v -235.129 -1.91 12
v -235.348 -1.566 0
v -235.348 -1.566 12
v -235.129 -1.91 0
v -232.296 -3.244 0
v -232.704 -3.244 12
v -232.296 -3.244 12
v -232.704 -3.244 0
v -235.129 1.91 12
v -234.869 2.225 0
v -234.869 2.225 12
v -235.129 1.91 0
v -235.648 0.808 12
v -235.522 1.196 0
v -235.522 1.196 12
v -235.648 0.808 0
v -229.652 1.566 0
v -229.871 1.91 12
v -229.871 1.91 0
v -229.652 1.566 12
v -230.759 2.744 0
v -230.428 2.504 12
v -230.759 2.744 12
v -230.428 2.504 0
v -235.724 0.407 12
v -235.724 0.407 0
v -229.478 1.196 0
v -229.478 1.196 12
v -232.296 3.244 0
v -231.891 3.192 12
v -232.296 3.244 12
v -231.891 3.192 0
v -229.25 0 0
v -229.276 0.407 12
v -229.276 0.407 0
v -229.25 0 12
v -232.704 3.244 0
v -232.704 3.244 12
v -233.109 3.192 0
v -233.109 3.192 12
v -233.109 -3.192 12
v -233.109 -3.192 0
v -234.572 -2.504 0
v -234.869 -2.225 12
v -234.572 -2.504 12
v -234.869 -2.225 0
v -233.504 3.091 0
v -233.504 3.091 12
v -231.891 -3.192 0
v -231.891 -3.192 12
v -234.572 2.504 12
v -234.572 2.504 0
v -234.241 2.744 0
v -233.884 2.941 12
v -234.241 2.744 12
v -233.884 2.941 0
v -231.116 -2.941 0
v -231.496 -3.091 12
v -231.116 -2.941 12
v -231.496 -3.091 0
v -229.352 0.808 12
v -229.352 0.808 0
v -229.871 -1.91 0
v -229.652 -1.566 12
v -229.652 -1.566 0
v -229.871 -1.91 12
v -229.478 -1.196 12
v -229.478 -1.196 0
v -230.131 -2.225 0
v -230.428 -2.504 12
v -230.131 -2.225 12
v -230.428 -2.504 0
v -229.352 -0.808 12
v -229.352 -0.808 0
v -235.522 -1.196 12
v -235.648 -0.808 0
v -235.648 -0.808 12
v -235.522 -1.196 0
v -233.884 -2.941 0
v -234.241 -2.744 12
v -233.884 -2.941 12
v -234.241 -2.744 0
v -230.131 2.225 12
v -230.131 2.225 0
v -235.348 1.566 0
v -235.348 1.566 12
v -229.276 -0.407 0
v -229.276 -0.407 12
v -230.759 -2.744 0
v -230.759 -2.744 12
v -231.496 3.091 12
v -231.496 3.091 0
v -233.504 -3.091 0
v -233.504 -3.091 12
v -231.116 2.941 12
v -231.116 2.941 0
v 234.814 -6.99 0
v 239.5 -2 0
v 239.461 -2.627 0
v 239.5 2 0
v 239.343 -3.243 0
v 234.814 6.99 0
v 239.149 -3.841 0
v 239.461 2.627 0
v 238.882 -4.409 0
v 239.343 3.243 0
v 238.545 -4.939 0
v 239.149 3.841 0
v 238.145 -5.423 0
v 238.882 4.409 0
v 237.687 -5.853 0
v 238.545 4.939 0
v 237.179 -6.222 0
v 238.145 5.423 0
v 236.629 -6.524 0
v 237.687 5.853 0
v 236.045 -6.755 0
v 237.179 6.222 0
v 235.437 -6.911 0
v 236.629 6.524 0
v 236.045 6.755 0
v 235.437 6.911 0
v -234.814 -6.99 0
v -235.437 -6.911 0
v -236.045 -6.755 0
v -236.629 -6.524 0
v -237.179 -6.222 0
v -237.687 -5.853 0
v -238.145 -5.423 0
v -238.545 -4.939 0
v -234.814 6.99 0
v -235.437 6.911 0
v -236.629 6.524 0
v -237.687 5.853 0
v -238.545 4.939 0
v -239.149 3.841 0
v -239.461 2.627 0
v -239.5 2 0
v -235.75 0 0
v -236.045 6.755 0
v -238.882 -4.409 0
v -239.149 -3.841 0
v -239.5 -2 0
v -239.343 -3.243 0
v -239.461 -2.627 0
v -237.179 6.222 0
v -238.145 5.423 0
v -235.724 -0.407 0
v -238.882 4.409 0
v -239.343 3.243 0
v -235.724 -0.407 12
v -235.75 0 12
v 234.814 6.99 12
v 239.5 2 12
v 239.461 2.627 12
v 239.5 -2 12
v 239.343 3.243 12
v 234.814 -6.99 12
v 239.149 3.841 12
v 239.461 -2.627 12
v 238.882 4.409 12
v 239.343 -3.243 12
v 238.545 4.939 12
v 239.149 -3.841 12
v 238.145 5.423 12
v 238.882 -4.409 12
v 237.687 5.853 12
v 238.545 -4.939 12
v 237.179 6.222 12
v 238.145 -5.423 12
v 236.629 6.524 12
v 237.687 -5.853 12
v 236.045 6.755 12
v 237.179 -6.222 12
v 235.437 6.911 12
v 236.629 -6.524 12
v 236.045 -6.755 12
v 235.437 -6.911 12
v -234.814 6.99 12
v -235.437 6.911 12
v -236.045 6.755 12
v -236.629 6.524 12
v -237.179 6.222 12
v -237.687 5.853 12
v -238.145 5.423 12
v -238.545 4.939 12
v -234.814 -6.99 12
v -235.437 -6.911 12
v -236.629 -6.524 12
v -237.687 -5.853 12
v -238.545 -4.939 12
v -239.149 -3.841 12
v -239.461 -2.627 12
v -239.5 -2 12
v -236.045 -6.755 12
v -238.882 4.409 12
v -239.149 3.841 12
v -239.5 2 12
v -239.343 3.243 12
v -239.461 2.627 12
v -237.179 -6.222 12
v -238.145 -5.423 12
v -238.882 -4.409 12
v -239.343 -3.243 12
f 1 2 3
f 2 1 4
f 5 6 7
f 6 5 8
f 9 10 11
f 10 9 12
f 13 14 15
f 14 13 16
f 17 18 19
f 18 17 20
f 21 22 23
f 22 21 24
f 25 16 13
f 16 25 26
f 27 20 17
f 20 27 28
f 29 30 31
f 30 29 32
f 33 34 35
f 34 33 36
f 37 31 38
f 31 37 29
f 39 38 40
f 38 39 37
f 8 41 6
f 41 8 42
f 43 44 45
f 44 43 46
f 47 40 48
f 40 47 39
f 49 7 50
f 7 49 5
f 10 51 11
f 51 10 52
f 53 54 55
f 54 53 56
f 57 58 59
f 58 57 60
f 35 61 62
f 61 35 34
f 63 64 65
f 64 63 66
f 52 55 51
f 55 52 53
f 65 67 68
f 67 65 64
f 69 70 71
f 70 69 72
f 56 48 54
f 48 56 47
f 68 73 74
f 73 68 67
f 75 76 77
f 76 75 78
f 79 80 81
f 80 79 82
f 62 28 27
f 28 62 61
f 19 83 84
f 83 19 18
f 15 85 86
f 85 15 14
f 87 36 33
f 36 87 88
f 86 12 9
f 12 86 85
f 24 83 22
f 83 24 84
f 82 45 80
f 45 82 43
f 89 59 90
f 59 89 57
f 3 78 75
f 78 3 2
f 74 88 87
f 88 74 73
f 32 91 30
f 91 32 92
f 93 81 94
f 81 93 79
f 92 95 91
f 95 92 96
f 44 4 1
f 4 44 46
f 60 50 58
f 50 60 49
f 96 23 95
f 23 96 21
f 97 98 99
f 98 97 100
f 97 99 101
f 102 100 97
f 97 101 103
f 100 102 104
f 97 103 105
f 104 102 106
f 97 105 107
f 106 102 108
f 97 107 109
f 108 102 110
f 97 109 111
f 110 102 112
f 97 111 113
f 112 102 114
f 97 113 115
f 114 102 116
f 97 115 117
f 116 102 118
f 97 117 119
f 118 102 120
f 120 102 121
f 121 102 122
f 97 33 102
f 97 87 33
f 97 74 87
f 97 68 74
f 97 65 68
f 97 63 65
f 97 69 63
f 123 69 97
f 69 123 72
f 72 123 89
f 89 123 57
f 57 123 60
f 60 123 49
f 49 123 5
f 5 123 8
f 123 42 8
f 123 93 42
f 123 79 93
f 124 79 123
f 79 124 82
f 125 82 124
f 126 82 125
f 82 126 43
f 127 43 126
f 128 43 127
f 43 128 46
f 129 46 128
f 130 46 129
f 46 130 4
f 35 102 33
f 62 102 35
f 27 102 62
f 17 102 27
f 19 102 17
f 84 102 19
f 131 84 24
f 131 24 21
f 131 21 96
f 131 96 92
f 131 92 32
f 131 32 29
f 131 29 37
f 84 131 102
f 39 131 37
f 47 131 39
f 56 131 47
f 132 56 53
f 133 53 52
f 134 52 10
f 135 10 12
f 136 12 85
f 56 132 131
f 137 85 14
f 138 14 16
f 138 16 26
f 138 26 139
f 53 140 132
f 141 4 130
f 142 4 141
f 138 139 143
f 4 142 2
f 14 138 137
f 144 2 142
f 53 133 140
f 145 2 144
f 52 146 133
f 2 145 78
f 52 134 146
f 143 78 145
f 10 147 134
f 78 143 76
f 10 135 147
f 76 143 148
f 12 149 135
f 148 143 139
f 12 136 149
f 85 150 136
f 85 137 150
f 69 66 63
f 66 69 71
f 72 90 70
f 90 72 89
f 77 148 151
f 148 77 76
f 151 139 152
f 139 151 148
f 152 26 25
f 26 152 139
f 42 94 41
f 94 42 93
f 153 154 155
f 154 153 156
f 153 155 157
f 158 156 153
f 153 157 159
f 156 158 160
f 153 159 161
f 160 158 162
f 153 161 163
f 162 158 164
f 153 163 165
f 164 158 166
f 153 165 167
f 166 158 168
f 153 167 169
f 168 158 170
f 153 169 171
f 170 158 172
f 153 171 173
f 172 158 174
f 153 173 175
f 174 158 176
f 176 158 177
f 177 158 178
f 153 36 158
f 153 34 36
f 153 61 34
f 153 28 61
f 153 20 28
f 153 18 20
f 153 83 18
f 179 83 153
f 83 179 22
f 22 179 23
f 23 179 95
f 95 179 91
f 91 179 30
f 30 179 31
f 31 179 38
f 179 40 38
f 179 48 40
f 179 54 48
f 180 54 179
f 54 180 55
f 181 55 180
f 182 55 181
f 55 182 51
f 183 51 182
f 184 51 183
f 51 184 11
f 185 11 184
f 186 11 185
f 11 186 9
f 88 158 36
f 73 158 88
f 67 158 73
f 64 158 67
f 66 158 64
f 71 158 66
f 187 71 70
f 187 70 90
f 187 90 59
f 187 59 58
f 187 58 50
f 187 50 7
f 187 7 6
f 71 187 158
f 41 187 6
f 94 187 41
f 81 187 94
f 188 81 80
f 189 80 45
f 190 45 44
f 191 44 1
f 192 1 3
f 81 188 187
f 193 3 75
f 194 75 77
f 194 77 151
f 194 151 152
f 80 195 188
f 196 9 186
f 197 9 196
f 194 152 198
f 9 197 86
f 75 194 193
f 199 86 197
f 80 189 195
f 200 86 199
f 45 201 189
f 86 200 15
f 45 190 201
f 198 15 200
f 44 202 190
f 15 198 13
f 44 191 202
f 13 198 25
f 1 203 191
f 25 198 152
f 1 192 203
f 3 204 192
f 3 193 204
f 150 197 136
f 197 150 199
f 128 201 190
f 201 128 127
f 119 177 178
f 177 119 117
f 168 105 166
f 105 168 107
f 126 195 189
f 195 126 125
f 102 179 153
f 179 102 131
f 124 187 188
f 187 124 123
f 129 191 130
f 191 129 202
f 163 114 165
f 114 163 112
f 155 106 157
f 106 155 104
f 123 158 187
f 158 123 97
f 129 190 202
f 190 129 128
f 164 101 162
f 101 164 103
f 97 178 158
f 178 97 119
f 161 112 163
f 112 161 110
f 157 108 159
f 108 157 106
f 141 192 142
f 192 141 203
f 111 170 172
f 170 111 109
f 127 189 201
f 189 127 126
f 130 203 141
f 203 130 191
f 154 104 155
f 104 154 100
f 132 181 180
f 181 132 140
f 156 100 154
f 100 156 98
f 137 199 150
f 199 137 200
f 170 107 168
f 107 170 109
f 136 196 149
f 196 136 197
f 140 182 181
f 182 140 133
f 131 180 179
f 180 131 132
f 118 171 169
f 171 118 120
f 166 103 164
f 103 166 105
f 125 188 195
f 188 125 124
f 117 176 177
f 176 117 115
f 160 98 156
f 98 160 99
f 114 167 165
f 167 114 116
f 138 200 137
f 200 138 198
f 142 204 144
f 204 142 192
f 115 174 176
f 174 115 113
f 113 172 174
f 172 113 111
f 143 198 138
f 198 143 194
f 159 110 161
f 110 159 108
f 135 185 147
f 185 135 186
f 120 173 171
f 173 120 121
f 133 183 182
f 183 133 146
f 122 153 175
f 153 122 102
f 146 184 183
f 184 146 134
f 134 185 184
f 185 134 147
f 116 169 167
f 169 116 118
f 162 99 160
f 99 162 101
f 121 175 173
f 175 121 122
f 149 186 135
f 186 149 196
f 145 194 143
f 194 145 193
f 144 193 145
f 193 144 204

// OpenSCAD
$fn = 50;


difference() {
	union() {
		hull() {
			translate(v = [-234.5000000000, 2.0000000000, 0]) {
				cylinder(h = 12, r = 5);
			}
			translate(v = [234.5000000000, 2.0000000000, 0]) {
				cylinder(h = 12, r = 5);
			}
			translate(v = [-234.5000000000, -2.0000000000, 0]) {
				cylinder(h = 12, r = 5);
			}
			translate(v = [234.5000000000, -2.0000000000, 0]) {
				cylinder(h = 12, r = 5);
			}
		}
	}
	union() {
		translate(v = [-232.5000000000, 0.0000000000, 0]) {
			cylinder(h = 12, r = 3.2500000000);
		}
		translate(v = [-232.5000000000, 0.0000000000, 0]) {
			cylinder(h = 12, r = 1.8000000000);
		}
		translate(v = [-232.5000000000, 0.0000000000, 0]) {
			cylinder(h = 12, r = 1.8000000000);
		}
		translate(v = [-232.5000000000, 0.0000000000, 0]) {
			cylinder(h = 12, r = 1.8000000000);
		}
	}
}
